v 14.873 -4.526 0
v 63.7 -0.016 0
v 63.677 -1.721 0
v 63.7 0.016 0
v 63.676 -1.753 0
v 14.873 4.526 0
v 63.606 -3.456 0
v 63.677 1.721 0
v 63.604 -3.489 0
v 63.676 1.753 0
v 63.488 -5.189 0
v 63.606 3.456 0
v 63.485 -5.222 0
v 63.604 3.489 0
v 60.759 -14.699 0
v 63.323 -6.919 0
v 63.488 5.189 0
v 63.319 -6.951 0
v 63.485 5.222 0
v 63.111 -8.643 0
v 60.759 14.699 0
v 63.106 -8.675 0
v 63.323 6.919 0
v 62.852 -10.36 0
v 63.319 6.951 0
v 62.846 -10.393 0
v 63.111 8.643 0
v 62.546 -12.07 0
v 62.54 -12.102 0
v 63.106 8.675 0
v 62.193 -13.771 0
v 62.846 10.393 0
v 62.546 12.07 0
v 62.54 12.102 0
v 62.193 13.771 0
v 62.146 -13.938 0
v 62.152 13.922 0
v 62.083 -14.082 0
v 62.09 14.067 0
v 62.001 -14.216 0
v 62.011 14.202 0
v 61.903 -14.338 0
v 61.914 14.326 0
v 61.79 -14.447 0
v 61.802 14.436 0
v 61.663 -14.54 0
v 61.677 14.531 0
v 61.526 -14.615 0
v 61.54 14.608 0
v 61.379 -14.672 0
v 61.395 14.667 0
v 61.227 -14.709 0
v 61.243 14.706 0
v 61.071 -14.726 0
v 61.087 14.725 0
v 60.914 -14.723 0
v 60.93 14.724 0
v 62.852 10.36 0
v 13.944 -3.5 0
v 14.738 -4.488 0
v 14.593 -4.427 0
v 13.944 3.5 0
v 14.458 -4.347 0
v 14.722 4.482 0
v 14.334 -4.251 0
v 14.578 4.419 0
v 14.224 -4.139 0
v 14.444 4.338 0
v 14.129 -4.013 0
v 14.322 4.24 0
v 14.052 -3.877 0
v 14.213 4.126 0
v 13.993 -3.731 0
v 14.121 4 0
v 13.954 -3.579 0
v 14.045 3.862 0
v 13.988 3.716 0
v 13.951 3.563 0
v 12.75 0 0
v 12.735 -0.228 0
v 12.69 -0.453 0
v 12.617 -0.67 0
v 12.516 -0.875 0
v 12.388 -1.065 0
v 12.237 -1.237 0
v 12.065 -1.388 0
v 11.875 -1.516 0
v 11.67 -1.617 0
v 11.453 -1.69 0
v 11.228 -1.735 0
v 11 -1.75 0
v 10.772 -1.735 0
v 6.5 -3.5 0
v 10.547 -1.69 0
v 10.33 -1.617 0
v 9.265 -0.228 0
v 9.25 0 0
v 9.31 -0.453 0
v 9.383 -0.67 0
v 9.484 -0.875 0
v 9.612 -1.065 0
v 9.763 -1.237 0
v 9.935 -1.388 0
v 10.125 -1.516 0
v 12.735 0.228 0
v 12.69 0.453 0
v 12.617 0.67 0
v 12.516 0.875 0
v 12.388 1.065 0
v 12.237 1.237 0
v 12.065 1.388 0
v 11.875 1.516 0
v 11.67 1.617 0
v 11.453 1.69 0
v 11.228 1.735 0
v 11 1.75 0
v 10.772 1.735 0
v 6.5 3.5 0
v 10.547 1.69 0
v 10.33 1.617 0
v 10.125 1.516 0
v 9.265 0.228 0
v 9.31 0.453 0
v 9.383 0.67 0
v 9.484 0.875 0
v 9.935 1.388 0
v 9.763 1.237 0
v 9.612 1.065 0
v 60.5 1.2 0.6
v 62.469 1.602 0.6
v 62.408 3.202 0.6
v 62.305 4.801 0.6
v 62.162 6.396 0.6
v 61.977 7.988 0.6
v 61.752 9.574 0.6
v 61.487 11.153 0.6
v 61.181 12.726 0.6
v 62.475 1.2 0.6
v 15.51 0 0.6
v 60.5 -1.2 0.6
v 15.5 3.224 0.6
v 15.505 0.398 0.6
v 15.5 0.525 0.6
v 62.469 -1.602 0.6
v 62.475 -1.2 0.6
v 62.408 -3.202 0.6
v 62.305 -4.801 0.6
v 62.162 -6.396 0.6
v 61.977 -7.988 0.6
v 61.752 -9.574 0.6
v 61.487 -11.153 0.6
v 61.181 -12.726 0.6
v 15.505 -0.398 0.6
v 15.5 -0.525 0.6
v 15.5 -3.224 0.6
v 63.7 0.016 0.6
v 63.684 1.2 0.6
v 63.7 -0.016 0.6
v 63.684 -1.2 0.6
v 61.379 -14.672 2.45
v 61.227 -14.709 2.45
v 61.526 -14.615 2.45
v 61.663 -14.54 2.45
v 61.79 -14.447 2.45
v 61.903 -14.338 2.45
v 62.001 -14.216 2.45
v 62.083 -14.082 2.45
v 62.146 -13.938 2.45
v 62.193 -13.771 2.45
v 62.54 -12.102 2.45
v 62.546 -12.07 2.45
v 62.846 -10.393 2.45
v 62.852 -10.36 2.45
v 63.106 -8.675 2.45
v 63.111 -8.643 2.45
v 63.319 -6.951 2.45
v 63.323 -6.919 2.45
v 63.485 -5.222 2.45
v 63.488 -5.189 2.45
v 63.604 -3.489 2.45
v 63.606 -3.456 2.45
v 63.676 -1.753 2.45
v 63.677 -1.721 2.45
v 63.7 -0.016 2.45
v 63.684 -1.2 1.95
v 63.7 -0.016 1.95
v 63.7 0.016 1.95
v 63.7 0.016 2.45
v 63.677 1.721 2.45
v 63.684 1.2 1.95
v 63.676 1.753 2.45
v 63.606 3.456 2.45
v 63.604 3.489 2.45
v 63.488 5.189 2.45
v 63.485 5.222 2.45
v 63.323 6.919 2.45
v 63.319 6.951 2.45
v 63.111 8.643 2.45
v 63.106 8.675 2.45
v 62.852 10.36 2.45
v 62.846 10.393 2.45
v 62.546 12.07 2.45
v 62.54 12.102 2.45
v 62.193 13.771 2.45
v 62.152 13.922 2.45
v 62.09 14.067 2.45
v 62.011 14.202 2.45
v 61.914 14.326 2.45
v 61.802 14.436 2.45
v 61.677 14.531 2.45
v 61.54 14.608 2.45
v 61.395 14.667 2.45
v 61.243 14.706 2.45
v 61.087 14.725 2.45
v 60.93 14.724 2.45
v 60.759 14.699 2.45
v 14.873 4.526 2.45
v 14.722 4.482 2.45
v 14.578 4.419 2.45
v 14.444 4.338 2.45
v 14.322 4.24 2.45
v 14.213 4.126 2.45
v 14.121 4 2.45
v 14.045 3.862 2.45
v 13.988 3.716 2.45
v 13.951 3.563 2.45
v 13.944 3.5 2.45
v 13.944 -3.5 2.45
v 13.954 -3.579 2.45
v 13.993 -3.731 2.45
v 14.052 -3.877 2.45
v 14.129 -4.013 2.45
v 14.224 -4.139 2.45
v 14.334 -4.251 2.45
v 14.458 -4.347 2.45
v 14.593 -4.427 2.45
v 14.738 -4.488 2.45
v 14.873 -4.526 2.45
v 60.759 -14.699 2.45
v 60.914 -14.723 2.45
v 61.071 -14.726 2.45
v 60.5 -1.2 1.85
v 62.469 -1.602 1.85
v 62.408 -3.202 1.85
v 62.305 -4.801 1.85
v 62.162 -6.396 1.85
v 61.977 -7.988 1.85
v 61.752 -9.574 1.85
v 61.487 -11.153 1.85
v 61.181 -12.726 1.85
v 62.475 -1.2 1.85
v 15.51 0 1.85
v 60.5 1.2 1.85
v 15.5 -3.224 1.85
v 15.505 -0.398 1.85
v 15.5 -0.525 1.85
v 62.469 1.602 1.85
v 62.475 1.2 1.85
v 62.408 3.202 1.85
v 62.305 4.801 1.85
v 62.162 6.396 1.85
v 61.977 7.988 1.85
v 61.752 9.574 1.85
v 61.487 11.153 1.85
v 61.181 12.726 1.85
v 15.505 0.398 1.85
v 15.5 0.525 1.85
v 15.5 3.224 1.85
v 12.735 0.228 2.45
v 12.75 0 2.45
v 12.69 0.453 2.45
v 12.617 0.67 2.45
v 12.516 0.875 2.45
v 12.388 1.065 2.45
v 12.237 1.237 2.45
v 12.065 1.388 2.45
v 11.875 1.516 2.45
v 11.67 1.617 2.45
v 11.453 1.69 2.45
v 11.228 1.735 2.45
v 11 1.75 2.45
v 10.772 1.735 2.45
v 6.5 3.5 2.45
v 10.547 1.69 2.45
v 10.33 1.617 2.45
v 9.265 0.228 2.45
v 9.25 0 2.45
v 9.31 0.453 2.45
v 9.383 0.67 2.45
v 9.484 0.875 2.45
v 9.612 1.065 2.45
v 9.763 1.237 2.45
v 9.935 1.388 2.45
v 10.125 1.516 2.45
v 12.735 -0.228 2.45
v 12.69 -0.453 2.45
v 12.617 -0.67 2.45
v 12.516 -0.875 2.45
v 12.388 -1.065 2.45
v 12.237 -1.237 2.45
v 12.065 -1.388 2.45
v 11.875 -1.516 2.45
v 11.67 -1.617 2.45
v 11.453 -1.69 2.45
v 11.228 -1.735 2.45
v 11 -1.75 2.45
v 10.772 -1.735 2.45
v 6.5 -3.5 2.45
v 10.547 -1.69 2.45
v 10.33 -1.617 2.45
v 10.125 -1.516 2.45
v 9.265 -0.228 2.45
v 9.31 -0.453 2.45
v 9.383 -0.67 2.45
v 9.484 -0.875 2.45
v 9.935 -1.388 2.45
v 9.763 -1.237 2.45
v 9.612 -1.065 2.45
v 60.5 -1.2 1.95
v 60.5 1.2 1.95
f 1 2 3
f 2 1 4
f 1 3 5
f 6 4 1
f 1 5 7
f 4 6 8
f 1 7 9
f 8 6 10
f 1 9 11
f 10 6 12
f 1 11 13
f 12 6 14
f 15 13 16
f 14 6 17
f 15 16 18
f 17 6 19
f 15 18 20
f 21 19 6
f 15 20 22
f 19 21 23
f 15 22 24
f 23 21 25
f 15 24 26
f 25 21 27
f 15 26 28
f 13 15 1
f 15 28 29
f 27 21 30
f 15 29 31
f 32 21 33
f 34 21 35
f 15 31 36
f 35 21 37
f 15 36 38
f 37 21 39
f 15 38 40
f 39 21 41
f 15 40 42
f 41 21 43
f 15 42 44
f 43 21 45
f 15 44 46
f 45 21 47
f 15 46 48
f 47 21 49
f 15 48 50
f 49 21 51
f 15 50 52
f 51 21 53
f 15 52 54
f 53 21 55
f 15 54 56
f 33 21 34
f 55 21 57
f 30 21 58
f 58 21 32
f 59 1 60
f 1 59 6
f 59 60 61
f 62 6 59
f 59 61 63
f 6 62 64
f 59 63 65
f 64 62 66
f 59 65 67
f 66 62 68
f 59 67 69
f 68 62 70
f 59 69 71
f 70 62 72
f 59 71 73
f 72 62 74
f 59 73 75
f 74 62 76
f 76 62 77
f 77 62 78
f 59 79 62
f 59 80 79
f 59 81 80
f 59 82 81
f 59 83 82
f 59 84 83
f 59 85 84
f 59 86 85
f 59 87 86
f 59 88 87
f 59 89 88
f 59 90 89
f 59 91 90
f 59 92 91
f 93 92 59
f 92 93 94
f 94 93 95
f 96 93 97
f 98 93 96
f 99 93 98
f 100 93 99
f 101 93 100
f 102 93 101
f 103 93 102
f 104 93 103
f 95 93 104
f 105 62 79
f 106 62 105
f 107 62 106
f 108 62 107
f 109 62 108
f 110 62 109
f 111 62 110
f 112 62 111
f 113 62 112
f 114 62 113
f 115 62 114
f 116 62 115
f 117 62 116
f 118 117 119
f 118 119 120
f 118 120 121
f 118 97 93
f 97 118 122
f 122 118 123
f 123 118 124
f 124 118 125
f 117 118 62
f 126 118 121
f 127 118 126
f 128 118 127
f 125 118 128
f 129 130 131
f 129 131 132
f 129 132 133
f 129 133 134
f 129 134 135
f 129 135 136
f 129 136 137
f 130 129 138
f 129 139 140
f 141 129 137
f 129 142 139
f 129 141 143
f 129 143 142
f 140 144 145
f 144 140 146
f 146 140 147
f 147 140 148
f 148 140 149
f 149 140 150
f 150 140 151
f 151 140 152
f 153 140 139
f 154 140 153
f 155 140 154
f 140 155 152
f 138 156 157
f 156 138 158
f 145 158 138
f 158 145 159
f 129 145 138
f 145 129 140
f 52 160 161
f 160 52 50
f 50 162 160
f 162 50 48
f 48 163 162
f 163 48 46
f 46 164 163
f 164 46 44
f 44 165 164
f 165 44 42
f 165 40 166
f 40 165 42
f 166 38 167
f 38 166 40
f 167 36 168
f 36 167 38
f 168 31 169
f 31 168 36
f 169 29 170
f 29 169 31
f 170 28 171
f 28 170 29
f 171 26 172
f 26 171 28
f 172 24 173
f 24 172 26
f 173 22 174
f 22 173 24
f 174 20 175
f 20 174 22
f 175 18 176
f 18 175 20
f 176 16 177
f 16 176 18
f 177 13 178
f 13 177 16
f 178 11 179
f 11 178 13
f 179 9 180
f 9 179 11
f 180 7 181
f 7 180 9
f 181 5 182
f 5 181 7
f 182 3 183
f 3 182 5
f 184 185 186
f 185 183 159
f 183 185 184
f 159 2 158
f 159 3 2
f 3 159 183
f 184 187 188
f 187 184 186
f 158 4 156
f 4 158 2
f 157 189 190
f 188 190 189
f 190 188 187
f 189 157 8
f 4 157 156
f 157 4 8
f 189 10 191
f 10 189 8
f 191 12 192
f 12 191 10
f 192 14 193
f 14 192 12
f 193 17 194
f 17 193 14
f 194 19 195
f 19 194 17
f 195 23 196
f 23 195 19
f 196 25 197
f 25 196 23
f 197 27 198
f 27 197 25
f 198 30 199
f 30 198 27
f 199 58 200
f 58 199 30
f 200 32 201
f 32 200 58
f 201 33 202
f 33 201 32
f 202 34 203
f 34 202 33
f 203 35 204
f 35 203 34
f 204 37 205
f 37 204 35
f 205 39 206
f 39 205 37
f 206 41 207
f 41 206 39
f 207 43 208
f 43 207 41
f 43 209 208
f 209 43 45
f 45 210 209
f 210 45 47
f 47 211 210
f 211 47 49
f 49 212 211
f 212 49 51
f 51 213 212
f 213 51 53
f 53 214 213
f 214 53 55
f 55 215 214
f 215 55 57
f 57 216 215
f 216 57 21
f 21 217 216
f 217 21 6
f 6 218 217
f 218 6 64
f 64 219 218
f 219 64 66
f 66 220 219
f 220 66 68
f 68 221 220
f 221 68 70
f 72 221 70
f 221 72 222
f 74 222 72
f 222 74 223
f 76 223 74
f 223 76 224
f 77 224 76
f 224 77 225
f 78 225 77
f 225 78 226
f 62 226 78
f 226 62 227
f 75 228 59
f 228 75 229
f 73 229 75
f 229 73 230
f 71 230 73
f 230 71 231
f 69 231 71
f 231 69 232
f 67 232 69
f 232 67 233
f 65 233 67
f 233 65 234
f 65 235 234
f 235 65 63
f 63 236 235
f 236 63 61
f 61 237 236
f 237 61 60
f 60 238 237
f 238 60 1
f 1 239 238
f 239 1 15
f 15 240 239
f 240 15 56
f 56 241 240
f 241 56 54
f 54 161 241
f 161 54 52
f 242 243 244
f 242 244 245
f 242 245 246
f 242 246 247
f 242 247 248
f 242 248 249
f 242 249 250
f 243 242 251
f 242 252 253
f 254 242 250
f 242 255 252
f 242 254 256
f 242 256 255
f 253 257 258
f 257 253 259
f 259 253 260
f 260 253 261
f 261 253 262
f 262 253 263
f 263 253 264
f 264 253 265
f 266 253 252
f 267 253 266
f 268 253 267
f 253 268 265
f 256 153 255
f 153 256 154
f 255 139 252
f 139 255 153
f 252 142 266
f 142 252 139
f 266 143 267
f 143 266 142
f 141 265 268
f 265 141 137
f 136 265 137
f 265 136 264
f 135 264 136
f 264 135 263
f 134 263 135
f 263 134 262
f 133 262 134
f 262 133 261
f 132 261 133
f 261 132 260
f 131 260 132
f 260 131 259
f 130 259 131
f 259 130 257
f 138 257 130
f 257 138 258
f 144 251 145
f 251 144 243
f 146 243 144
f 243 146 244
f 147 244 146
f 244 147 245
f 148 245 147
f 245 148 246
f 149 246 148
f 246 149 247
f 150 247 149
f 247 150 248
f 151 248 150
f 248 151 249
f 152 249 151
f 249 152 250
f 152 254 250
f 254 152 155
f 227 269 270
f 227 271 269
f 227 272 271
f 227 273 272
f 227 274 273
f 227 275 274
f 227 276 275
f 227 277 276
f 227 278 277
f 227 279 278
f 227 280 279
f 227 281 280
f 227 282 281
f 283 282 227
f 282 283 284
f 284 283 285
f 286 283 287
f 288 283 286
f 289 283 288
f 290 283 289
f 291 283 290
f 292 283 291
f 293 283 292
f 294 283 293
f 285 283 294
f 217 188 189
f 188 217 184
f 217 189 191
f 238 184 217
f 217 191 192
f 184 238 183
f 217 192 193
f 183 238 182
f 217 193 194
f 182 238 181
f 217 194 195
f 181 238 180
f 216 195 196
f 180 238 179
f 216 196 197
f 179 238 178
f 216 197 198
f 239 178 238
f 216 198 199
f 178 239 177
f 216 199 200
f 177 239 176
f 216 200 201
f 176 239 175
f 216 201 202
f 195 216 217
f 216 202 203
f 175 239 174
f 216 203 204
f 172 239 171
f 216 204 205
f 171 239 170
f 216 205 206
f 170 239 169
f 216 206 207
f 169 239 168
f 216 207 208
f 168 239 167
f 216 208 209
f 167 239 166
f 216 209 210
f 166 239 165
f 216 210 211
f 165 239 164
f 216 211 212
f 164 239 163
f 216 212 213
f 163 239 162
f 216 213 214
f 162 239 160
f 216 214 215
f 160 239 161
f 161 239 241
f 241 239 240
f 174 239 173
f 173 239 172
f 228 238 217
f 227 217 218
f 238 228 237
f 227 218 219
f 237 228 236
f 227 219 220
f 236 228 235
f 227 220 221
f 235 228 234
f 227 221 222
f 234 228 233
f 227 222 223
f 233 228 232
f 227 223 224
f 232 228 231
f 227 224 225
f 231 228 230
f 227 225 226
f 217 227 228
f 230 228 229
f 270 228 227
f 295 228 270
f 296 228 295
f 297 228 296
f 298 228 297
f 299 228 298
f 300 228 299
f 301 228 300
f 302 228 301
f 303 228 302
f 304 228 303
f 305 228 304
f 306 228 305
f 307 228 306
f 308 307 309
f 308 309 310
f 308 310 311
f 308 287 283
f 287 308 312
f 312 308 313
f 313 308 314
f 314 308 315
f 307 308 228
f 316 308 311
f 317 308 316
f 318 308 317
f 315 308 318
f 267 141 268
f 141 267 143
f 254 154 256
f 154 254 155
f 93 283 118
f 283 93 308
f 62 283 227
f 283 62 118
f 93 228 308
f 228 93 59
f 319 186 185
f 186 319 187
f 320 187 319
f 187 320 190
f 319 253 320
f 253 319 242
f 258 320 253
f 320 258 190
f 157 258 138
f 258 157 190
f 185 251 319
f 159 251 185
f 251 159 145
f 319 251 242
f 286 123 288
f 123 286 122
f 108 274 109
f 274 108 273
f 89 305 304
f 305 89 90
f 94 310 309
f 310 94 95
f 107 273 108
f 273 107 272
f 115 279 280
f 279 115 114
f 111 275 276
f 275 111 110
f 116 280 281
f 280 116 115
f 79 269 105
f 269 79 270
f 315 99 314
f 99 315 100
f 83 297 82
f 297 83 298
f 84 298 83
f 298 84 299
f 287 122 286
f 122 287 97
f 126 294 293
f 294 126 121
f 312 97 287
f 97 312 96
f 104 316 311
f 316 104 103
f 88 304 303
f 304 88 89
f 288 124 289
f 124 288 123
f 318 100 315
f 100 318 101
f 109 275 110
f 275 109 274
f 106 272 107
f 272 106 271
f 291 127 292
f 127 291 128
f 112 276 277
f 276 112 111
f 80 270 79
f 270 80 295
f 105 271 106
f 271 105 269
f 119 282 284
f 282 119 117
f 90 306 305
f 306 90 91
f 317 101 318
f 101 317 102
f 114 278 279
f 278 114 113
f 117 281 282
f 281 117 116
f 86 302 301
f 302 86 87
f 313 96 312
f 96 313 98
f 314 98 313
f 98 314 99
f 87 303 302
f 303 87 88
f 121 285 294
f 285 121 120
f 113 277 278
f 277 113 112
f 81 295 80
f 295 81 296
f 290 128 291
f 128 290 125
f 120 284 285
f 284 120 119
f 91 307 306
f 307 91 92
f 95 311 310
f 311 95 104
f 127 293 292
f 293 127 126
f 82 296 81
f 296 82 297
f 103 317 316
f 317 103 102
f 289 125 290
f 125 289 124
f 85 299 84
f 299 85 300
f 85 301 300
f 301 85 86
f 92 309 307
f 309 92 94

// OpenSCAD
// file: parameters.scad
// =============================================================================
// Gen-AS Vernier flux-claw ultra - WOUND-AWARE (HARD GATE)
// Dual-rotor vernier: Rotor B +22.5 deg vs 12-slot stator; O5 flux claws
// =============================================================================

wire_awg            = 26;
wire_od             = 0.45;
turns               = 200;      // +5 vs Gen-AP 195
fill                = 0.70;
layers_per_face     = 2;
wind_build_axial    = layers_per_face * wire_od * fill;   // 0.63 mm
wind_build_radial   = 3 * wire_od * fill;                 // 0.945 mm

coil_id_r           = 15.5;
coil_od_r           = 62.5;
span_deg            = 25.0;
former_web          = 1.25;     // thinner vs AP 1.30
flange_t            = 0.60;
wall                = 1.2;
slot_w              = 2.4;
mount_hole          = 3.5;
tab_len             = 7.0;

former_bare_h       = former_web + 2 * flange_t;            // 2.45 mm
coil_envelope_h     = former_bare_h + 2 * wind_build_axial; // 3.71 mm

run_clear           = 0.50;
gap_spacer_h        = run_clear + wind_build_axial;         // 1.13 mm
m2m                 = coil_envelope_h + 2 * run_clear;      // 4.71 mm

coil_stations       = 12;
bay_r_in            = coil_id_r - 2.0 - wind_build_radial;
bay_r_out           = coil_od_r + 2.0 + wind_build_radial;
bay_span            = span_deg + 4.0;
bay_offset          = 2.0;
stator_thick        = former_bare_h;
stator_od           = 160.0;
shaft_clear_stator  = 34.0;
coil_mount_r        = 25.5;

large_pocket_d      = 20.3;
small_pocket_d      = 5.3;
pocket_h            = 5.2;
large_n             = 8;
R_large             = 39.0;     // closer to copper centroid vs AP R=39.5
R_small_inner       = 25.0;
R_small_mid         = 39.0;
R_small_outer       = 55.0;
carrier_od          = 156.0;
carrier_thick       = 7.5;
hub_h               = 10.0;
hub_od              = 30.0;
rotor_b_offset_deg  = 22.5;     // vernier offset vs 12-slot stator

shaft_bore          = 8.35;
bearing_d           = 21.85;
bearing_h           = 7.2;
m3_clear            = 3.5;
bolt_r_inner        = 36.0;
bolt_n_inner        = 6;
flange_bolt_r       = 72.0;
flange_bolt_n       = 6;
brace_r             = 68.0;
brace_d             = 4.3;
brace_n             = 4;

spacer_pad_od       = 14.0;
spacer_pad_id       = m3_clear;
endbell_od          = 160.0;
endbell_thick       = 8.0;
endbell_shaft_clear = 10.0;

$fn = 64;
// main file
// Gen-AS pancake former — wind BEFORE assembly
include <parameters.scad>;
$fn = 48;

module sector_2d(r_in, r_out, ang) {
    polygon([
        for (a = [-ang/2 : ang/16 : ang/2]) [r_in*cos(a), r_in*sin(a)],
        for (a = [ang/2 : -ang/16 : -ang/2]) [r_out*cos(a), r_out*sin(a)]
    ]);
}
module flange() {
    linear_extrude(flange_t) offset(r=wall) sector_2d(coil_id_r, coil_od_r, span_deg);
}
difference() {
    union() {
        flange();
        translate([0, 0, flange_t])
            linear_extrude(former_web)
                difference() {
                    offset(r=wall) sector_2d(coil_id_r, coil_od_r, span_deg);
                    sector_2d(coil_id_r + 0.01, coil_od_r - 0.01, span_deg - 1.5);
                }
        translate([0, 0, flange_t + former_web]) flange();
        translate([coil_id_r - tab_len - 2, -3.5, 0])
            cube([tab_len + 2, 7, former_bare_h]);
    }
    translate([coil_od_r - 2, -slot_w/2, flange_t])
        cube([wall + 4, slot_w, former_web + 0.1]);
    translate([coil_id_r - tab_len/2 - 1, 0, -0.1])
        cylinder(d=mount_hole, h=former_bare_h + 1);
}
